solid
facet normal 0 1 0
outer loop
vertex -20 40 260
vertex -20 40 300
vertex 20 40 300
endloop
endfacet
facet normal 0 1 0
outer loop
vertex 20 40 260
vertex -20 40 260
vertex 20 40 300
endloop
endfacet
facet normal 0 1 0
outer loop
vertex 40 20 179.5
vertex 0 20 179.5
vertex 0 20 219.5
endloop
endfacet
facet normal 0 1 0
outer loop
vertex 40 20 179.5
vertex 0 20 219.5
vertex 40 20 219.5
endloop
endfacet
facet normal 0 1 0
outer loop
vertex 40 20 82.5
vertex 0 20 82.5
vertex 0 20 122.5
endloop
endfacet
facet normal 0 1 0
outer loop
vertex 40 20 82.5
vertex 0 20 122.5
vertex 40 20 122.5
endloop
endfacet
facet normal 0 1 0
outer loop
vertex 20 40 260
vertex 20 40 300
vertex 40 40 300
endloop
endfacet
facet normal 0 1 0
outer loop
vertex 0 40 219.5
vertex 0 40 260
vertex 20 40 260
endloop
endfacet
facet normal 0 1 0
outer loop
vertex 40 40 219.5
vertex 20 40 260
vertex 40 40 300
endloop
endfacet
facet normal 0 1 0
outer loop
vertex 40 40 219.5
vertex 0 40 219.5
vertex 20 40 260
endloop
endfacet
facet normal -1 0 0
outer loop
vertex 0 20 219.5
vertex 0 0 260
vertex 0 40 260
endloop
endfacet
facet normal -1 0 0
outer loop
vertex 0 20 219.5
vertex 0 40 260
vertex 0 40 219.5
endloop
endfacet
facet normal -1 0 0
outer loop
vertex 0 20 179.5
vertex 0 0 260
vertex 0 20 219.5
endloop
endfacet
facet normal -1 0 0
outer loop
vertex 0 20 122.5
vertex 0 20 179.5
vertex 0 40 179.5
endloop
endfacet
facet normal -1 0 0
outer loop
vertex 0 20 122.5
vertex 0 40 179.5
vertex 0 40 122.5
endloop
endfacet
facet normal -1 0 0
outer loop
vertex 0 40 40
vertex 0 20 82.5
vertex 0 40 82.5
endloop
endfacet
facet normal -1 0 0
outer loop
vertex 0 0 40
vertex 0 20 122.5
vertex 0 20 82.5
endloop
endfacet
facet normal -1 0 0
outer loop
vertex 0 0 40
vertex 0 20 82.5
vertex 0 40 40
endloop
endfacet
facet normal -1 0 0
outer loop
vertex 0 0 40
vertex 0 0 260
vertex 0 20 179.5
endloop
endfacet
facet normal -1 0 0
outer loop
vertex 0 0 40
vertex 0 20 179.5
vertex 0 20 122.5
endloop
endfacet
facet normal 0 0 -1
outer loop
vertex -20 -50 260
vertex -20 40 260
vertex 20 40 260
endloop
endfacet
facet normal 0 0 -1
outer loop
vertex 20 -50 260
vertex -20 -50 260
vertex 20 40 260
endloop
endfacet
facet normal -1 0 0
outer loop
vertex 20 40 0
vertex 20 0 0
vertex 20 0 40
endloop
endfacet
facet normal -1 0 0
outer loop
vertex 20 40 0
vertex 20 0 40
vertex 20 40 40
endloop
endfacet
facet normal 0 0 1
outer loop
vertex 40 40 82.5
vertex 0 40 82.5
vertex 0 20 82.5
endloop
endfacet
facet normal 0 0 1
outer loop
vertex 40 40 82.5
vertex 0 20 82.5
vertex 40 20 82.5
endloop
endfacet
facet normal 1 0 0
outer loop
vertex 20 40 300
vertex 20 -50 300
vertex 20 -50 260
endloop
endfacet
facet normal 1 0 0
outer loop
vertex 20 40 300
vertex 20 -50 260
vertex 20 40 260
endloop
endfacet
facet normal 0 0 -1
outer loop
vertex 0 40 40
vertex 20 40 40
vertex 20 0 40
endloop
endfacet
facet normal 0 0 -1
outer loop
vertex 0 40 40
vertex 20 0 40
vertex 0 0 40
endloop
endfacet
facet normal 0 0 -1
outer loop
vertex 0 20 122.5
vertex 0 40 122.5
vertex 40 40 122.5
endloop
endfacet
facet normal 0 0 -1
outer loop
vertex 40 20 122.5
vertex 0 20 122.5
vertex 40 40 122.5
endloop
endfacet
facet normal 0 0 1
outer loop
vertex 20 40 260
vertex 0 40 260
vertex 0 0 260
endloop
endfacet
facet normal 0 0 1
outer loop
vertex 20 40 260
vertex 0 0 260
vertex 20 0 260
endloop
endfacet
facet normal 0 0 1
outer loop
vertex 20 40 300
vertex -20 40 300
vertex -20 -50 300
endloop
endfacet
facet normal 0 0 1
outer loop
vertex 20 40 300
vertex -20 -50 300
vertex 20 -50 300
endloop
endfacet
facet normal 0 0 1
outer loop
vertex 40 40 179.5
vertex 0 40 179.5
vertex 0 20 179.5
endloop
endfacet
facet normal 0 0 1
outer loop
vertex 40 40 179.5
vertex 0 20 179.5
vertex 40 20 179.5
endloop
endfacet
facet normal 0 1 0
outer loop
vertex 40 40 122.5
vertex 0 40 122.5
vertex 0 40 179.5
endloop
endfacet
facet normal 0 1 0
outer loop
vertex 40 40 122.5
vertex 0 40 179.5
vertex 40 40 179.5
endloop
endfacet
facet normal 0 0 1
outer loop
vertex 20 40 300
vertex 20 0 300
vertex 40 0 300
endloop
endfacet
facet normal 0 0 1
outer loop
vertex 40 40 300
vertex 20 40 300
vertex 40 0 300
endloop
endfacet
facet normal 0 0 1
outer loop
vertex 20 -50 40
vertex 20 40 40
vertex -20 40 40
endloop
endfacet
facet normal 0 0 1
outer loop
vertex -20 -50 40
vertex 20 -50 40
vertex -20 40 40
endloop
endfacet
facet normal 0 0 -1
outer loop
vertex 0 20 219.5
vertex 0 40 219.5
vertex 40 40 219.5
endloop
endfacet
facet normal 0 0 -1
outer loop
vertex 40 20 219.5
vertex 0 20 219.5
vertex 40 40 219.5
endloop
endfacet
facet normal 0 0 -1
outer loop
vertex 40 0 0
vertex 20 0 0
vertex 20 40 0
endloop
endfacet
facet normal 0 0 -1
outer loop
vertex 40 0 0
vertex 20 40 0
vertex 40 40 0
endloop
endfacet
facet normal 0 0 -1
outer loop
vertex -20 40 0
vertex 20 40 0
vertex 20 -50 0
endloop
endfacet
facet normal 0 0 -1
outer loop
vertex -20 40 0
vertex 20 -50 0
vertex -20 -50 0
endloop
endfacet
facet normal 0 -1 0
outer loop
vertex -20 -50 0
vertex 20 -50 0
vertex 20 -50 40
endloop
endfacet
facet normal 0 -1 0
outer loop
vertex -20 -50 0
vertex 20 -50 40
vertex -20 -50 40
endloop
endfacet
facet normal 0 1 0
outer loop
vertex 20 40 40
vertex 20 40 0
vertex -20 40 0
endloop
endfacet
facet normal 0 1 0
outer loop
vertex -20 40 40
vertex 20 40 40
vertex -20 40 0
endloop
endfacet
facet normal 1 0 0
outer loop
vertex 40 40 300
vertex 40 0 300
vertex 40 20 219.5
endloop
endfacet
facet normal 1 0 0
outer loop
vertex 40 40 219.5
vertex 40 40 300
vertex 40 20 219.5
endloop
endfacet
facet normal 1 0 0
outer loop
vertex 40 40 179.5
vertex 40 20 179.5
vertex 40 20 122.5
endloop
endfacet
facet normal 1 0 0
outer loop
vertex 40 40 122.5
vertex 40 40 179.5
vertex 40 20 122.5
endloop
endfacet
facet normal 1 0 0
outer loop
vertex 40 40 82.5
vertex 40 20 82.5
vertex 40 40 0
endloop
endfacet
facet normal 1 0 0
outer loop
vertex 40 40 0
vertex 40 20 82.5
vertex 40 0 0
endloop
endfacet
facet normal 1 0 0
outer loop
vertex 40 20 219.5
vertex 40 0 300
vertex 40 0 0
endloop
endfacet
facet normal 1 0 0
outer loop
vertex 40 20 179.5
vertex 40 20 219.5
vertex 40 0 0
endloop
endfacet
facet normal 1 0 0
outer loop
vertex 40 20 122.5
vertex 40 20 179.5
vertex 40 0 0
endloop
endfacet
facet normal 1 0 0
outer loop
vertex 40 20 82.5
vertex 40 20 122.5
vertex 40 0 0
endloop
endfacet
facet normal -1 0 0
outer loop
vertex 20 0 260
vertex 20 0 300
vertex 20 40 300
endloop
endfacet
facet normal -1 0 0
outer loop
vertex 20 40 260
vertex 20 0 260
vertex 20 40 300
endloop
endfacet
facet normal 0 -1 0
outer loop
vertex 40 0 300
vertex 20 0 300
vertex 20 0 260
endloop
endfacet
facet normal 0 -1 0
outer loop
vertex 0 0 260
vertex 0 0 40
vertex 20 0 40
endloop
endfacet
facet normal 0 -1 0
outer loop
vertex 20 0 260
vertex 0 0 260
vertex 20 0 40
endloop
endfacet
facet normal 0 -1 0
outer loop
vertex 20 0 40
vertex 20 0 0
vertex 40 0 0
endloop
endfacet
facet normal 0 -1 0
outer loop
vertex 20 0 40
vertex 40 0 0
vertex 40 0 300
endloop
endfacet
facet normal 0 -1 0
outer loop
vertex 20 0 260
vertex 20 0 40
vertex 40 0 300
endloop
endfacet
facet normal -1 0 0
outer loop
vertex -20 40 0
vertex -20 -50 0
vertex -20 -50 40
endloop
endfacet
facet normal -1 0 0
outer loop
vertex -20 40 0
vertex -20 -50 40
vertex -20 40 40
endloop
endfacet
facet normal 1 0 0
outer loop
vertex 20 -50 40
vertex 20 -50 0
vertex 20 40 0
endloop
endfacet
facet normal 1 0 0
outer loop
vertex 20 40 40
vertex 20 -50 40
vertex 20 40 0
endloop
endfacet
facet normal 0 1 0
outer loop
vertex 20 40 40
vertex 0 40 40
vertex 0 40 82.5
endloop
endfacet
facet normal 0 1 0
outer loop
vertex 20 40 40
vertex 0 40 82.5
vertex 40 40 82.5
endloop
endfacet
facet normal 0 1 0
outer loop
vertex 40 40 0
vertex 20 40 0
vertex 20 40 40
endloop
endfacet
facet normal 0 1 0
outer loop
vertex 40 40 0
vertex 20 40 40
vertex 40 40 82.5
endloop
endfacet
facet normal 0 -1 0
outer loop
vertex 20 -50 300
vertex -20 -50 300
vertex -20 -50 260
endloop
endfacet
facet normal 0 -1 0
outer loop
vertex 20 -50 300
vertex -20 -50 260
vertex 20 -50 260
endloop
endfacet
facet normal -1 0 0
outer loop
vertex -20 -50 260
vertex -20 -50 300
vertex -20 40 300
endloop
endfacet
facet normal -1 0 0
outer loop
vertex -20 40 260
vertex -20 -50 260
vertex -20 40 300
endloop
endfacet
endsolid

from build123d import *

# Parameters (mm, degrees)
SKETCH1_W           = 40
SKETCH1_H           = 300
BOSS_EXTRUDE1_DEPTH = 40
SKETCH2_W           = 40
SKETCH2_H           = 40
CUT_EXTRUDE1_DEPTH  = 20
SKETCH7_W           = 20
SKETCH7_H           = 40
CUT_EXTRUDE4_DEPTH  = 40
SKETCH3_W           = 40
SKETCH3_H           = 90
BOSS_EXTRUDE2_DEPTH = 40
SKETCH6_W           = 20
SKETCH6_H           = 40
CUT_EXTRUDE3_DEPTH  = 40
SKETCH4_W           = 40
SKETCH4_H           = 90
BOSS_EXTRUDE3_DEPTH = 40


with BuildPart() as part:
    # Sketch1 → Boss-Extrude1 (new body)
    with BuildSketch(Plane(origin=(0, 0, 0), x_dir=(1, 0, 0), z_dir=(0, 1, 0))):
        with Locations((20, -150)):
            Rectangle(SKETCH1_W, SKETCH1_H)
    extrude(amount=BOSS_EXTRUDE1_DEPTH)

    # Sketch2 → Cut-Extrude1 (cut)
    with BuildSketch(Plane(origin=(0, 40, 0), x_dir=(1, 0, 0), z_dir=(0, 1, 0))):
        with Locations((20, -102.5)):
            Rectangle(SKETCH2_W, SKETCH2_H)
        with Locations((20, -199.5)):
            Rectangle(SKETCH2_W, SKETCH2_H)
    extrude(amount=-CUT_EXTRUDE1_DEPTH, mode=Mode.SUBTRACT)

    # Sketch7 → Cut-Extrude4 (cut)
    with BuildSketch(Plane.XY.offset(300)):
        with Locations((10, 20)):
            Rectangle(SKETCH7_W, SKETCH7_H)
    extrude(amount=-CUT_EXTRUDE4_DEPTH, mode=Mode.SUBTRACT)

    # Sketch6 → Cut-Extrude3 (cut)
    with BuildSketch(Plane(origin=(0, 0, 0), x_dir=(-1, 0, 0), z_dir=(0, 0, -1))):
        with Locations((-10, 20)):
            Rectangle(SKETCH6_W, SKETCH6_H)
    extrude(amount=-CUT_EXTRUDE3_DEPTH, mode=Mode.SUBTRACT)


with BuildPart() as body_2:
    # Sketch3 → Boss-Extrude2 (new body)
    with BuildSketch(Plane.XY.offset(300)):
        with Locations((0, -5)):
            Rectangle(SKETCH3_W, SKETCH3_H)
    extrude(amount=-BOSS_EXTRUDE2_DEPTH)


with BuildPart() as body_3:
    # Sketch4 → Boss-Extrude3 (new body)
    with BuildSketch(Plane(origin=(0, 0, 0), x_dir=(-1, 0, 0), z_dir=(0, 0, -1))):
        with Locations((0, -5)):
            Rectangle(SKETCH4_W, SKETCH4_H)
    extrude(amount=-BOSS_EXTRUDE3_DEPTH)


solid = Compound([part.part, body_2.part, body_3.part])
